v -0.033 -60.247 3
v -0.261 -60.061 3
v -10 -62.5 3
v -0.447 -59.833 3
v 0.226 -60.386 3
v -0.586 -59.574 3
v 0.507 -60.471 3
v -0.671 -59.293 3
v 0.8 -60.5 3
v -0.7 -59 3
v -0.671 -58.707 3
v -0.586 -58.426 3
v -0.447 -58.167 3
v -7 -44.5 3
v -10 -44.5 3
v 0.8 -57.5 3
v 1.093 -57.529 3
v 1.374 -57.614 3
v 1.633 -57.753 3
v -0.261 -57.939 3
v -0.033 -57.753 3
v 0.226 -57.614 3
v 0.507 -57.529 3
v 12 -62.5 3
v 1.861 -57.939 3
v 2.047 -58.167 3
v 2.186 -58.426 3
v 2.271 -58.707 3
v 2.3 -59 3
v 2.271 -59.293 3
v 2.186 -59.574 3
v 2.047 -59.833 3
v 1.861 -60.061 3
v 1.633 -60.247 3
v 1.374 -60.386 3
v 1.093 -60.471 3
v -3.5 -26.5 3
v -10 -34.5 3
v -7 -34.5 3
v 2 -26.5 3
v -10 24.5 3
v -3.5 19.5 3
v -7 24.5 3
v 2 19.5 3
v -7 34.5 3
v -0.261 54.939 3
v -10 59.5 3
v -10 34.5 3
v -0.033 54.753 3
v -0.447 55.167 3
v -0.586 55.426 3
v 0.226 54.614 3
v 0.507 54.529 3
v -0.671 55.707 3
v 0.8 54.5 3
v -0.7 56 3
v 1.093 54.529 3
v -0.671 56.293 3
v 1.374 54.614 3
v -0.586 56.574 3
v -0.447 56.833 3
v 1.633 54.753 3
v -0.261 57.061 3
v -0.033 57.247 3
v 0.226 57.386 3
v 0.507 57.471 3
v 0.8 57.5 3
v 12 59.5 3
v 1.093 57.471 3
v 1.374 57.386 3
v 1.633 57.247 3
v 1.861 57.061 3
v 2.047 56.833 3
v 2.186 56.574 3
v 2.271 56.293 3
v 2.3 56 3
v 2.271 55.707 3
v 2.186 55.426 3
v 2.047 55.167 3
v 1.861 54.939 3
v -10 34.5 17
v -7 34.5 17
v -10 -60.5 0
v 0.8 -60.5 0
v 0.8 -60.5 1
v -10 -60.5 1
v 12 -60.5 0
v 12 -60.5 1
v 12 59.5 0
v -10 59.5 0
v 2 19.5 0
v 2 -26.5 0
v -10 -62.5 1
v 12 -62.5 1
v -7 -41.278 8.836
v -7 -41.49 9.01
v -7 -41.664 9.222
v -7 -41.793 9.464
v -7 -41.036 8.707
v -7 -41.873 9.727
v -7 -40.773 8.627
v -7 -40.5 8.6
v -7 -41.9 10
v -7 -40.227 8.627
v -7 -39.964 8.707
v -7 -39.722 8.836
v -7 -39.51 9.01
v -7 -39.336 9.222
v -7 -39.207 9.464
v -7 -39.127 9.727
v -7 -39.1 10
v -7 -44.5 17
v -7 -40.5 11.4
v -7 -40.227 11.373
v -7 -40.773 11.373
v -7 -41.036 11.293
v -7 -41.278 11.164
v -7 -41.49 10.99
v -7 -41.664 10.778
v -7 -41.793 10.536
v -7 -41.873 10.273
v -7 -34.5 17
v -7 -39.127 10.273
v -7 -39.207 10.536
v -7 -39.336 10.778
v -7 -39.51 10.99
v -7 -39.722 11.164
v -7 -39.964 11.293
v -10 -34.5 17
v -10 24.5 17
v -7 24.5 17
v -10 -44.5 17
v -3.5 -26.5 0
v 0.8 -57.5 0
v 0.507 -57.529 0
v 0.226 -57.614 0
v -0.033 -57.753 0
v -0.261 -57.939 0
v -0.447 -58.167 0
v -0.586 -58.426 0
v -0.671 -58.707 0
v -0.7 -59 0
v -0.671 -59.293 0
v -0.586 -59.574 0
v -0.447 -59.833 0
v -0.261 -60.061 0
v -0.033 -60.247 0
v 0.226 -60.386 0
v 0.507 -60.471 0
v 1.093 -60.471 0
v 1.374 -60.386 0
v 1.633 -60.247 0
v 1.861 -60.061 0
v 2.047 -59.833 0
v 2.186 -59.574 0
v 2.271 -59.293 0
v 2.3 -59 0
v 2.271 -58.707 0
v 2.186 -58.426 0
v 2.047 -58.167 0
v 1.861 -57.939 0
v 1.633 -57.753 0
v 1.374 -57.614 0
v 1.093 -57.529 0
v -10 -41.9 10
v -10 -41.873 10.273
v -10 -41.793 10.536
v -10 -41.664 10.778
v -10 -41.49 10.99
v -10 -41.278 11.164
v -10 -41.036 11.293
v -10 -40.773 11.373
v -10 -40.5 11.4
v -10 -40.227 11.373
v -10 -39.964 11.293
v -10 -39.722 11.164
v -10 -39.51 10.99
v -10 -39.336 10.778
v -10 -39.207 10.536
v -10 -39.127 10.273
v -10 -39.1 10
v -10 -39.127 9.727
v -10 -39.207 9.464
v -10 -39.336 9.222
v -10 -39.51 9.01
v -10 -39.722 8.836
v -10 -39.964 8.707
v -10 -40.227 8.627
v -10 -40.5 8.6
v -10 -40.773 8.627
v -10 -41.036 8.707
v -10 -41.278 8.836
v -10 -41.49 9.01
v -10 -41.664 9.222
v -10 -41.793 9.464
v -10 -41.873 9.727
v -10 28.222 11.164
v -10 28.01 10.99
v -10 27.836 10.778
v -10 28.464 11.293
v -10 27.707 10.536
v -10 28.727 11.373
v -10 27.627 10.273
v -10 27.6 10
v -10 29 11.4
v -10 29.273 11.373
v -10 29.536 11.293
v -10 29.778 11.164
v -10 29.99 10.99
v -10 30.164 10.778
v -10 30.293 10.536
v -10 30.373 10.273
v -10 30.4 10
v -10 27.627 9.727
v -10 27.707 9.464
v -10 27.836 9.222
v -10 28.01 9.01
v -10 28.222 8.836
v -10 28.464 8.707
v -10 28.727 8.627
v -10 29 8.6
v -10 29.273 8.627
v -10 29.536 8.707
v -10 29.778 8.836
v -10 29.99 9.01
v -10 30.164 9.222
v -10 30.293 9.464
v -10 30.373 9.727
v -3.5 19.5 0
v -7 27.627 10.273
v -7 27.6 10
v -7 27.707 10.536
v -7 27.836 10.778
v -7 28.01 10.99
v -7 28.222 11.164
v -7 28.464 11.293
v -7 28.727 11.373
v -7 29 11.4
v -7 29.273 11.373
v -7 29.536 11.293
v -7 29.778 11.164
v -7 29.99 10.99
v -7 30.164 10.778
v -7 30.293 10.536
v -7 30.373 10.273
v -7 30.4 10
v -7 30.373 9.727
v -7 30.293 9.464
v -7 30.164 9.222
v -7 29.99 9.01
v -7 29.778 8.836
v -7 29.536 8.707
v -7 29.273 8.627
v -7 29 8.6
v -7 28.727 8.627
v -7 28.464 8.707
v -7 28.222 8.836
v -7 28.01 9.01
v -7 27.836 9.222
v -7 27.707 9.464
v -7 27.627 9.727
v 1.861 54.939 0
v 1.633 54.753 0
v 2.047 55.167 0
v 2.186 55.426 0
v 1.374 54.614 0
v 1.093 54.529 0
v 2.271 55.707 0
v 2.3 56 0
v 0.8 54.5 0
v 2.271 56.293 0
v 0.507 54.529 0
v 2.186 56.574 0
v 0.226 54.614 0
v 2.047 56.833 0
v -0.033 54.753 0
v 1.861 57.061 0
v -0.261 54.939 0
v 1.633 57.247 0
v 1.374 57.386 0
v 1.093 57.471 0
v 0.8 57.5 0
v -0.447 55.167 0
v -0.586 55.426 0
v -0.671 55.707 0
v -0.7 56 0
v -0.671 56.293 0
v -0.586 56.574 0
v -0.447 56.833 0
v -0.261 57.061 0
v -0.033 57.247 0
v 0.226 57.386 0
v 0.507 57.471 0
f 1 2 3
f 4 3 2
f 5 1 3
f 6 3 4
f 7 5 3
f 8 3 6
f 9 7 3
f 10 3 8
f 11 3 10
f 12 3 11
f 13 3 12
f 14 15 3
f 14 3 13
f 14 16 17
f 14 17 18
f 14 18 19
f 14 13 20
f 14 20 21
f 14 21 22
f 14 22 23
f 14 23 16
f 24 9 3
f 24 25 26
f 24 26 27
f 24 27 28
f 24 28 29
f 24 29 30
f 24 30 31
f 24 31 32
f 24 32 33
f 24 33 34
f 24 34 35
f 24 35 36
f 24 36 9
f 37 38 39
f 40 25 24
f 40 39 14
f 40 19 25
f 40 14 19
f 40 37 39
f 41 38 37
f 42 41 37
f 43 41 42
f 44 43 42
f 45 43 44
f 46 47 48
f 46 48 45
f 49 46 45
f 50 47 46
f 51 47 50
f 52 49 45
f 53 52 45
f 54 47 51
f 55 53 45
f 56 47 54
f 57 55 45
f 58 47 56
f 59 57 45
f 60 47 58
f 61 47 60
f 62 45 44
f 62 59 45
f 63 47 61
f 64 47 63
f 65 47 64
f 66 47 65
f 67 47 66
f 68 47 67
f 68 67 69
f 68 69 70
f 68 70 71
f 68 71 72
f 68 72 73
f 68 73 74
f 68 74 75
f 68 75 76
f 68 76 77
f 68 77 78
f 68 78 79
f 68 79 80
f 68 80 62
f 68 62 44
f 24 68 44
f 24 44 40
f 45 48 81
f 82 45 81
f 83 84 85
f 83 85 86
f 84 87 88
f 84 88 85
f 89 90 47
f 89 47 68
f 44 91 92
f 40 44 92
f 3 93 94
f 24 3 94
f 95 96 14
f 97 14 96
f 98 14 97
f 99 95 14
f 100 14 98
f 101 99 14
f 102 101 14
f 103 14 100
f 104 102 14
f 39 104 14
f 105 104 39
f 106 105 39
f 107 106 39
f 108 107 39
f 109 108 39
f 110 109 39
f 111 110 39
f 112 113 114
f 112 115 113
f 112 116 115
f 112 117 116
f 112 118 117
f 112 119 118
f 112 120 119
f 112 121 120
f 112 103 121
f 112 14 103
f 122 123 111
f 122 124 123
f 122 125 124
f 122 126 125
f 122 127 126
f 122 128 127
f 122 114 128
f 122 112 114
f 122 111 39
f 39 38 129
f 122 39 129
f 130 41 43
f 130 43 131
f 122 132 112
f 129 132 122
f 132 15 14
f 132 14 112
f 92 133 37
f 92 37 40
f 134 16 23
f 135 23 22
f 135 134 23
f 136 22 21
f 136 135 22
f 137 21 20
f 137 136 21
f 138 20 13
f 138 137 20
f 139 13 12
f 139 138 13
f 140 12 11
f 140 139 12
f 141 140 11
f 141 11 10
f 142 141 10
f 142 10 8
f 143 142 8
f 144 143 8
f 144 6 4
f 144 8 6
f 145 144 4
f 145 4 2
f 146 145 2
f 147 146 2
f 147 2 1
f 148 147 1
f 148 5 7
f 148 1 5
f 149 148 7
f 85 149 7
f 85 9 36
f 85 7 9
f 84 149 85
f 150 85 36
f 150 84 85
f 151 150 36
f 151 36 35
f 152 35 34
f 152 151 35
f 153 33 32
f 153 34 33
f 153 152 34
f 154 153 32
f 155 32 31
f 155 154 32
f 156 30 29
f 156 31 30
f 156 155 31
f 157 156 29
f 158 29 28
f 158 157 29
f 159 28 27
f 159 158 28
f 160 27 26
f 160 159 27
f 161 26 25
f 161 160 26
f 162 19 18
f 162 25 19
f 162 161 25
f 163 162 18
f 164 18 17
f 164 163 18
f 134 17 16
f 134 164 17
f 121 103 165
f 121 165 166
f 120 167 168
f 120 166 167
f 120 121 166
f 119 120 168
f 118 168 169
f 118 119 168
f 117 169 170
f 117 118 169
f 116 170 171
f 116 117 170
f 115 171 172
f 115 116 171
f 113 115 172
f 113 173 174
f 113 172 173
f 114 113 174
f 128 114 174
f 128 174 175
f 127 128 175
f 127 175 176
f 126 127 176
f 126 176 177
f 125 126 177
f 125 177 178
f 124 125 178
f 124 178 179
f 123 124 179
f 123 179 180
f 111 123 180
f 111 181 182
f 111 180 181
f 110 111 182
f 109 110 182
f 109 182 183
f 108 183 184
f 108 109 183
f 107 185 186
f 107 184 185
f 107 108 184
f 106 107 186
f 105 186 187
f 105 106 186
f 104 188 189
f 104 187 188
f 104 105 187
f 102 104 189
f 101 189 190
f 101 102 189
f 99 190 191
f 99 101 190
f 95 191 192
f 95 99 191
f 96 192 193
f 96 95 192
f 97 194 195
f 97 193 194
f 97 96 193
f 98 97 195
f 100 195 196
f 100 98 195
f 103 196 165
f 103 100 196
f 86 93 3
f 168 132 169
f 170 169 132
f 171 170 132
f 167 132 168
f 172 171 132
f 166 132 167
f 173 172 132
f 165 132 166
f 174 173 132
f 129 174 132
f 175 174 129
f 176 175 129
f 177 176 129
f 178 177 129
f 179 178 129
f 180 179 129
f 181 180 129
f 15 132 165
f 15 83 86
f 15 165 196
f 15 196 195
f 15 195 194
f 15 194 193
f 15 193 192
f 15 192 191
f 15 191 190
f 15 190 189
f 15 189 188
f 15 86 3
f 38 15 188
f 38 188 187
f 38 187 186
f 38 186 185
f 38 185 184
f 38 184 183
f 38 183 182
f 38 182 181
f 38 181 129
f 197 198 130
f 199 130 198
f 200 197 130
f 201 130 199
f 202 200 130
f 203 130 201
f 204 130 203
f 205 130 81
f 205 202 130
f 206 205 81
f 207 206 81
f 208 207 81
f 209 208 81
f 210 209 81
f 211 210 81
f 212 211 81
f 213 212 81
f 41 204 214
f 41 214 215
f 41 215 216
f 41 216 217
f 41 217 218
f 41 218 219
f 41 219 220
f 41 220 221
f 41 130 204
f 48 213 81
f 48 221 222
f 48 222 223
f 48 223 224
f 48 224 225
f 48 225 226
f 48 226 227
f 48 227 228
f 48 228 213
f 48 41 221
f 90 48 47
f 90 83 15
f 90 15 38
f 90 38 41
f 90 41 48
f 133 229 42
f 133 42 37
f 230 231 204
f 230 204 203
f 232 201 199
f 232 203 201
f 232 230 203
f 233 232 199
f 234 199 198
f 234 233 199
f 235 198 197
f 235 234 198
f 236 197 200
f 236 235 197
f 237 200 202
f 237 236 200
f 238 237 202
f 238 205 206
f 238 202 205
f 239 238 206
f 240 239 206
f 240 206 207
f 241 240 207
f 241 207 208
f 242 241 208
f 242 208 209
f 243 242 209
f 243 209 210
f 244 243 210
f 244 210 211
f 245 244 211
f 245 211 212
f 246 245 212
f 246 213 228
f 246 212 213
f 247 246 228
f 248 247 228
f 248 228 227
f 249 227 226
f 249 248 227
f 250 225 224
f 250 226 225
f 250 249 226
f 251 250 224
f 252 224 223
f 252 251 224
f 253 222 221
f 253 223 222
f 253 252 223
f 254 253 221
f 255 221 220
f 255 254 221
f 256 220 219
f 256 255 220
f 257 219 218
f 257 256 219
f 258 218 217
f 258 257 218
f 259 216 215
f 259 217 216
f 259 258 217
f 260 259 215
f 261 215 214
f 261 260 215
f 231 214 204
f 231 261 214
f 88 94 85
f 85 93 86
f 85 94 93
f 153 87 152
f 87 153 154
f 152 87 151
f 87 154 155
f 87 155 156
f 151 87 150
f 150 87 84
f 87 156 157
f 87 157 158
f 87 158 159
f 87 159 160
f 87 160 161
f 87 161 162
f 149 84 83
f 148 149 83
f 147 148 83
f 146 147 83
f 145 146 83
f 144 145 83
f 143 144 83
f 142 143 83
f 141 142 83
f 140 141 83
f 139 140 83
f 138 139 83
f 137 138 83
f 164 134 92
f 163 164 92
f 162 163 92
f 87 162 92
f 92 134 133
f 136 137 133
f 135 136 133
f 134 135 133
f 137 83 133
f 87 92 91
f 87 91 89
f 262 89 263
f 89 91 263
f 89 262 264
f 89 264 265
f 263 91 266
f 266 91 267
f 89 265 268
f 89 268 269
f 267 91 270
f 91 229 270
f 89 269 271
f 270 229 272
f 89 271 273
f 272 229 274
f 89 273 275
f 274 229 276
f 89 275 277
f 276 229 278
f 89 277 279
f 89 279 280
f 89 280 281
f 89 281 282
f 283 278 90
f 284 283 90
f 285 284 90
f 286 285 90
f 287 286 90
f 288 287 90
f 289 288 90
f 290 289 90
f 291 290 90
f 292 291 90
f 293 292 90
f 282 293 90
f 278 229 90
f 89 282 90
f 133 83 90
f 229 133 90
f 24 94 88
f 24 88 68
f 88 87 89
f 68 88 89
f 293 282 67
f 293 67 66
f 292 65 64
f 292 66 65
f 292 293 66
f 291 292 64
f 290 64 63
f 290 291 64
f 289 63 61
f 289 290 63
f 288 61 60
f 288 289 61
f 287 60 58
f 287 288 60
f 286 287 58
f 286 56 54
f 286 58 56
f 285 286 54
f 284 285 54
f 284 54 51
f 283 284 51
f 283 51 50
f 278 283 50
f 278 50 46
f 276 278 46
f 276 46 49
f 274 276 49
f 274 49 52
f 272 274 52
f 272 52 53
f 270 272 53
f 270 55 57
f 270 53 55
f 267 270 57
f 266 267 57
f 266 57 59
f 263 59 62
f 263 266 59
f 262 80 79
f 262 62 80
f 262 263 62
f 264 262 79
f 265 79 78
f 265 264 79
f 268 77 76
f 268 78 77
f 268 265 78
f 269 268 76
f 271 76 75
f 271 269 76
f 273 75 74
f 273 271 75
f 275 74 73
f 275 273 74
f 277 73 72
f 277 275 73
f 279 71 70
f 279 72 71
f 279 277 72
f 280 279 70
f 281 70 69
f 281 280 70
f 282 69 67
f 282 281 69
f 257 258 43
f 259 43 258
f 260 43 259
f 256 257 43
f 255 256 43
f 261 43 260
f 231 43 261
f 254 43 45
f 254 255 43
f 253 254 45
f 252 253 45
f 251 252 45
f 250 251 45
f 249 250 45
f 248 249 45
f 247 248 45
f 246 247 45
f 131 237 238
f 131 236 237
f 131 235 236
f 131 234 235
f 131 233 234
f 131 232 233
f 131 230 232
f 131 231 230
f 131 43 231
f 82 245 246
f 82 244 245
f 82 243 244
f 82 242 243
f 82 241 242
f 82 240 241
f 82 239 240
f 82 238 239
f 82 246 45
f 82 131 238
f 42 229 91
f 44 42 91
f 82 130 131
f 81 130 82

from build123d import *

# Parameters (mm, degrees)
BOX_W             = 22
BOX_H             = 122
BOX_DEPTH         = 3
BOX001_W          = 10
BOX001_H          = 17
BOX001_DEPTH      = 3
BOX002_W          = 10
BOX002_H          = 17
BOX002_DEPTH      = 3
BOX003_W          = 46
BOX003_H          = 5.5
BOX003_DEPTH      = 5
CYLINDER002_R     = 1.5
CYLINDER002_DEPTH = 5
CYLINDER003_R     = 1.5
CYLINDER003_DEPTH = 5
BOX004_W          = 2
BOX004_H          = 30
BOX004_DEPTH      = 2
CYLINDER_R        = 1.4
CYLINDER_DEPTH    = 5
CYLINDER004_R     = 1.4
CYLINDER004_DEPTH = 5


with BuildPart() as part:
    # Box → Box (join)
    with BuildSketch(Plane(origin=(-10, -62.5, 0), x_dir=(1, 0, 0), z_dir=(0, 0, 1))):
        with Locations((11, 61)):
            Rectangle(BOX_W, BOX_H)
    extrude(amount=BOX_DEPTH)

    # Box001 → Box001 (join)
    with BuildSketch(Plane(origin=(-10, -44.5, 0), x_dir=(0, 1, 0), z_dir=(1, 0, 0))):
        with Locations((5, 8.5)):
            Rectangle(BOX001_W, BOX001_H)
    extrude(amount=BOX001_DEPTH)

    # Box002 → Box002 (join)
    with BuildSketch(Plane(origin=(-10, 24.5, 0), x_dir=(0, 1, 0), z_dir=(1, 0, 0))):
        with Locations((5, 8.5)):
            Rectangle(BOX002_W, BOX002_H)
    extrude(amount=BOX002_DEPTH)

    # Box003 → Box003 (cut)
    with BuildSketch(Plane(origin=(-3.5, 19.5, -1), x_dir=(0, -1, 0), z_dir=(0, 0, 1))):
        with Locations((23, 2.75)):
            Rectangle(BOX003_W, BOX003_H)
    extrude(amount=BOX003_DEPTH, mode=Mode.SUBTRACT)

    # Cylinder002 → Cylinder002 (cut)
    with BuildSketch(Plane(origin=(0.8, -59, -1), x_dir=(0, 1, 0), z_dir=(0, 0, 1))):
        Circle(CYLINDER002_R)
    extrude(amount=CYLINDER002_DEPTH, mode=Mode.SUBTRACT)

    # Cylinder003 → Cylinder003 (cut)
    with BuildSketch(Plane(origin=(0.8, 56, -1), x_dir=(0, 1, 0), z_dir=(0, 0, 1))):
        Circle(CYLINDER003_R)
    extrude(amount=CYLINDER003_DEPTH, mode=Mode.SUBTRACT)

    # Box004 → Box004 (cut)
    with BuildSketch(Plane(origin=(16.8, -62.5, -1), x_dir=(0, 1, 0), z_dir=(0, 0, 1))):
        with Locations((1, 15)):
            Rectangle(BOX004_W, BOX004_H)
    extrude(amount=BOX004_DEPTH, mode=Mode.SUBTRACT)

    # Cylinder → Cylinder (cut)
    with BuildSketch(Plane(origin=(-6, -40.5, 10), x_dir=(0, -1, 0), z_dir=(-1, 0, 0))):
        Circle(CYLINDER_R)
    extrude(amount=CYLINDER_DEPTH, mode=Mode.SUBTRACT)

    # Cylinder004 → Cylinder004 (cut)
    with BuildSketch(Plane(origin=(-6, 29, 10), x_dir=(0, -1, 0), z_dir=(-1, 0, 0))):
        Circle(CYLINDER004_R)
    extrude(amount=CYLINDER004_DEPTH, mode=Mode.SUBTRACT)


solid = part.part
